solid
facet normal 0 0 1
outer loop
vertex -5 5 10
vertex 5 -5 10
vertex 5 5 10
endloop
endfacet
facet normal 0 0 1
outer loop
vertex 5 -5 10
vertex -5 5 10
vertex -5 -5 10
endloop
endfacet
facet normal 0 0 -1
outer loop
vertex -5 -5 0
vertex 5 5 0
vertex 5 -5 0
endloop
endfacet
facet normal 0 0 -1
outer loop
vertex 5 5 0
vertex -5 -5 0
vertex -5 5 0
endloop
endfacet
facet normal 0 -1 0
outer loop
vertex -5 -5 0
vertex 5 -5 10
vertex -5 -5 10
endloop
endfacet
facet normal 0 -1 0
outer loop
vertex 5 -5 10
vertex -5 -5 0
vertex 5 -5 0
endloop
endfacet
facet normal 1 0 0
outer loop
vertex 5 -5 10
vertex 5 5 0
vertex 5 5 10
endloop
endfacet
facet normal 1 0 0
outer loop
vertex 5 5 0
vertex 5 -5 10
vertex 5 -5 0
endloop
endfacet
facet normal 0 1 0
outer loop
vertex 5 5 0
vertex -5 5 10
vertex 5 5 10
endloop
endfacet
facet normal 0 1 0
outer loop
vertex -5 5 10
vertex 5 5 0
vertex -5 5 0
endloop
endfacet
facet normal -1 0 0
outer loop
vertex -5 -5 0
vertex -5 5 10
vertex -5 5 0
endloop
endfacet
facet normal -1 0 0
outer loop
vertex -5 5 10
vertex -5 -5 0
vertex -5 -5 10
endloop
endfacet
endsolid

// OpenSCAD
// Auto-generated from tests/data/feature_fixtures_manifest.json
// fixture: non_revolve_cube
// fixture_type: non_revolve
// description: Unit cube. Balanced inertia tensor edge-case; must be rejected.
$fn = 96;

size = [10.000000, 10.000000, 10.000000];

translate([-5.000000, -5.000000, 0]) cube(size);
